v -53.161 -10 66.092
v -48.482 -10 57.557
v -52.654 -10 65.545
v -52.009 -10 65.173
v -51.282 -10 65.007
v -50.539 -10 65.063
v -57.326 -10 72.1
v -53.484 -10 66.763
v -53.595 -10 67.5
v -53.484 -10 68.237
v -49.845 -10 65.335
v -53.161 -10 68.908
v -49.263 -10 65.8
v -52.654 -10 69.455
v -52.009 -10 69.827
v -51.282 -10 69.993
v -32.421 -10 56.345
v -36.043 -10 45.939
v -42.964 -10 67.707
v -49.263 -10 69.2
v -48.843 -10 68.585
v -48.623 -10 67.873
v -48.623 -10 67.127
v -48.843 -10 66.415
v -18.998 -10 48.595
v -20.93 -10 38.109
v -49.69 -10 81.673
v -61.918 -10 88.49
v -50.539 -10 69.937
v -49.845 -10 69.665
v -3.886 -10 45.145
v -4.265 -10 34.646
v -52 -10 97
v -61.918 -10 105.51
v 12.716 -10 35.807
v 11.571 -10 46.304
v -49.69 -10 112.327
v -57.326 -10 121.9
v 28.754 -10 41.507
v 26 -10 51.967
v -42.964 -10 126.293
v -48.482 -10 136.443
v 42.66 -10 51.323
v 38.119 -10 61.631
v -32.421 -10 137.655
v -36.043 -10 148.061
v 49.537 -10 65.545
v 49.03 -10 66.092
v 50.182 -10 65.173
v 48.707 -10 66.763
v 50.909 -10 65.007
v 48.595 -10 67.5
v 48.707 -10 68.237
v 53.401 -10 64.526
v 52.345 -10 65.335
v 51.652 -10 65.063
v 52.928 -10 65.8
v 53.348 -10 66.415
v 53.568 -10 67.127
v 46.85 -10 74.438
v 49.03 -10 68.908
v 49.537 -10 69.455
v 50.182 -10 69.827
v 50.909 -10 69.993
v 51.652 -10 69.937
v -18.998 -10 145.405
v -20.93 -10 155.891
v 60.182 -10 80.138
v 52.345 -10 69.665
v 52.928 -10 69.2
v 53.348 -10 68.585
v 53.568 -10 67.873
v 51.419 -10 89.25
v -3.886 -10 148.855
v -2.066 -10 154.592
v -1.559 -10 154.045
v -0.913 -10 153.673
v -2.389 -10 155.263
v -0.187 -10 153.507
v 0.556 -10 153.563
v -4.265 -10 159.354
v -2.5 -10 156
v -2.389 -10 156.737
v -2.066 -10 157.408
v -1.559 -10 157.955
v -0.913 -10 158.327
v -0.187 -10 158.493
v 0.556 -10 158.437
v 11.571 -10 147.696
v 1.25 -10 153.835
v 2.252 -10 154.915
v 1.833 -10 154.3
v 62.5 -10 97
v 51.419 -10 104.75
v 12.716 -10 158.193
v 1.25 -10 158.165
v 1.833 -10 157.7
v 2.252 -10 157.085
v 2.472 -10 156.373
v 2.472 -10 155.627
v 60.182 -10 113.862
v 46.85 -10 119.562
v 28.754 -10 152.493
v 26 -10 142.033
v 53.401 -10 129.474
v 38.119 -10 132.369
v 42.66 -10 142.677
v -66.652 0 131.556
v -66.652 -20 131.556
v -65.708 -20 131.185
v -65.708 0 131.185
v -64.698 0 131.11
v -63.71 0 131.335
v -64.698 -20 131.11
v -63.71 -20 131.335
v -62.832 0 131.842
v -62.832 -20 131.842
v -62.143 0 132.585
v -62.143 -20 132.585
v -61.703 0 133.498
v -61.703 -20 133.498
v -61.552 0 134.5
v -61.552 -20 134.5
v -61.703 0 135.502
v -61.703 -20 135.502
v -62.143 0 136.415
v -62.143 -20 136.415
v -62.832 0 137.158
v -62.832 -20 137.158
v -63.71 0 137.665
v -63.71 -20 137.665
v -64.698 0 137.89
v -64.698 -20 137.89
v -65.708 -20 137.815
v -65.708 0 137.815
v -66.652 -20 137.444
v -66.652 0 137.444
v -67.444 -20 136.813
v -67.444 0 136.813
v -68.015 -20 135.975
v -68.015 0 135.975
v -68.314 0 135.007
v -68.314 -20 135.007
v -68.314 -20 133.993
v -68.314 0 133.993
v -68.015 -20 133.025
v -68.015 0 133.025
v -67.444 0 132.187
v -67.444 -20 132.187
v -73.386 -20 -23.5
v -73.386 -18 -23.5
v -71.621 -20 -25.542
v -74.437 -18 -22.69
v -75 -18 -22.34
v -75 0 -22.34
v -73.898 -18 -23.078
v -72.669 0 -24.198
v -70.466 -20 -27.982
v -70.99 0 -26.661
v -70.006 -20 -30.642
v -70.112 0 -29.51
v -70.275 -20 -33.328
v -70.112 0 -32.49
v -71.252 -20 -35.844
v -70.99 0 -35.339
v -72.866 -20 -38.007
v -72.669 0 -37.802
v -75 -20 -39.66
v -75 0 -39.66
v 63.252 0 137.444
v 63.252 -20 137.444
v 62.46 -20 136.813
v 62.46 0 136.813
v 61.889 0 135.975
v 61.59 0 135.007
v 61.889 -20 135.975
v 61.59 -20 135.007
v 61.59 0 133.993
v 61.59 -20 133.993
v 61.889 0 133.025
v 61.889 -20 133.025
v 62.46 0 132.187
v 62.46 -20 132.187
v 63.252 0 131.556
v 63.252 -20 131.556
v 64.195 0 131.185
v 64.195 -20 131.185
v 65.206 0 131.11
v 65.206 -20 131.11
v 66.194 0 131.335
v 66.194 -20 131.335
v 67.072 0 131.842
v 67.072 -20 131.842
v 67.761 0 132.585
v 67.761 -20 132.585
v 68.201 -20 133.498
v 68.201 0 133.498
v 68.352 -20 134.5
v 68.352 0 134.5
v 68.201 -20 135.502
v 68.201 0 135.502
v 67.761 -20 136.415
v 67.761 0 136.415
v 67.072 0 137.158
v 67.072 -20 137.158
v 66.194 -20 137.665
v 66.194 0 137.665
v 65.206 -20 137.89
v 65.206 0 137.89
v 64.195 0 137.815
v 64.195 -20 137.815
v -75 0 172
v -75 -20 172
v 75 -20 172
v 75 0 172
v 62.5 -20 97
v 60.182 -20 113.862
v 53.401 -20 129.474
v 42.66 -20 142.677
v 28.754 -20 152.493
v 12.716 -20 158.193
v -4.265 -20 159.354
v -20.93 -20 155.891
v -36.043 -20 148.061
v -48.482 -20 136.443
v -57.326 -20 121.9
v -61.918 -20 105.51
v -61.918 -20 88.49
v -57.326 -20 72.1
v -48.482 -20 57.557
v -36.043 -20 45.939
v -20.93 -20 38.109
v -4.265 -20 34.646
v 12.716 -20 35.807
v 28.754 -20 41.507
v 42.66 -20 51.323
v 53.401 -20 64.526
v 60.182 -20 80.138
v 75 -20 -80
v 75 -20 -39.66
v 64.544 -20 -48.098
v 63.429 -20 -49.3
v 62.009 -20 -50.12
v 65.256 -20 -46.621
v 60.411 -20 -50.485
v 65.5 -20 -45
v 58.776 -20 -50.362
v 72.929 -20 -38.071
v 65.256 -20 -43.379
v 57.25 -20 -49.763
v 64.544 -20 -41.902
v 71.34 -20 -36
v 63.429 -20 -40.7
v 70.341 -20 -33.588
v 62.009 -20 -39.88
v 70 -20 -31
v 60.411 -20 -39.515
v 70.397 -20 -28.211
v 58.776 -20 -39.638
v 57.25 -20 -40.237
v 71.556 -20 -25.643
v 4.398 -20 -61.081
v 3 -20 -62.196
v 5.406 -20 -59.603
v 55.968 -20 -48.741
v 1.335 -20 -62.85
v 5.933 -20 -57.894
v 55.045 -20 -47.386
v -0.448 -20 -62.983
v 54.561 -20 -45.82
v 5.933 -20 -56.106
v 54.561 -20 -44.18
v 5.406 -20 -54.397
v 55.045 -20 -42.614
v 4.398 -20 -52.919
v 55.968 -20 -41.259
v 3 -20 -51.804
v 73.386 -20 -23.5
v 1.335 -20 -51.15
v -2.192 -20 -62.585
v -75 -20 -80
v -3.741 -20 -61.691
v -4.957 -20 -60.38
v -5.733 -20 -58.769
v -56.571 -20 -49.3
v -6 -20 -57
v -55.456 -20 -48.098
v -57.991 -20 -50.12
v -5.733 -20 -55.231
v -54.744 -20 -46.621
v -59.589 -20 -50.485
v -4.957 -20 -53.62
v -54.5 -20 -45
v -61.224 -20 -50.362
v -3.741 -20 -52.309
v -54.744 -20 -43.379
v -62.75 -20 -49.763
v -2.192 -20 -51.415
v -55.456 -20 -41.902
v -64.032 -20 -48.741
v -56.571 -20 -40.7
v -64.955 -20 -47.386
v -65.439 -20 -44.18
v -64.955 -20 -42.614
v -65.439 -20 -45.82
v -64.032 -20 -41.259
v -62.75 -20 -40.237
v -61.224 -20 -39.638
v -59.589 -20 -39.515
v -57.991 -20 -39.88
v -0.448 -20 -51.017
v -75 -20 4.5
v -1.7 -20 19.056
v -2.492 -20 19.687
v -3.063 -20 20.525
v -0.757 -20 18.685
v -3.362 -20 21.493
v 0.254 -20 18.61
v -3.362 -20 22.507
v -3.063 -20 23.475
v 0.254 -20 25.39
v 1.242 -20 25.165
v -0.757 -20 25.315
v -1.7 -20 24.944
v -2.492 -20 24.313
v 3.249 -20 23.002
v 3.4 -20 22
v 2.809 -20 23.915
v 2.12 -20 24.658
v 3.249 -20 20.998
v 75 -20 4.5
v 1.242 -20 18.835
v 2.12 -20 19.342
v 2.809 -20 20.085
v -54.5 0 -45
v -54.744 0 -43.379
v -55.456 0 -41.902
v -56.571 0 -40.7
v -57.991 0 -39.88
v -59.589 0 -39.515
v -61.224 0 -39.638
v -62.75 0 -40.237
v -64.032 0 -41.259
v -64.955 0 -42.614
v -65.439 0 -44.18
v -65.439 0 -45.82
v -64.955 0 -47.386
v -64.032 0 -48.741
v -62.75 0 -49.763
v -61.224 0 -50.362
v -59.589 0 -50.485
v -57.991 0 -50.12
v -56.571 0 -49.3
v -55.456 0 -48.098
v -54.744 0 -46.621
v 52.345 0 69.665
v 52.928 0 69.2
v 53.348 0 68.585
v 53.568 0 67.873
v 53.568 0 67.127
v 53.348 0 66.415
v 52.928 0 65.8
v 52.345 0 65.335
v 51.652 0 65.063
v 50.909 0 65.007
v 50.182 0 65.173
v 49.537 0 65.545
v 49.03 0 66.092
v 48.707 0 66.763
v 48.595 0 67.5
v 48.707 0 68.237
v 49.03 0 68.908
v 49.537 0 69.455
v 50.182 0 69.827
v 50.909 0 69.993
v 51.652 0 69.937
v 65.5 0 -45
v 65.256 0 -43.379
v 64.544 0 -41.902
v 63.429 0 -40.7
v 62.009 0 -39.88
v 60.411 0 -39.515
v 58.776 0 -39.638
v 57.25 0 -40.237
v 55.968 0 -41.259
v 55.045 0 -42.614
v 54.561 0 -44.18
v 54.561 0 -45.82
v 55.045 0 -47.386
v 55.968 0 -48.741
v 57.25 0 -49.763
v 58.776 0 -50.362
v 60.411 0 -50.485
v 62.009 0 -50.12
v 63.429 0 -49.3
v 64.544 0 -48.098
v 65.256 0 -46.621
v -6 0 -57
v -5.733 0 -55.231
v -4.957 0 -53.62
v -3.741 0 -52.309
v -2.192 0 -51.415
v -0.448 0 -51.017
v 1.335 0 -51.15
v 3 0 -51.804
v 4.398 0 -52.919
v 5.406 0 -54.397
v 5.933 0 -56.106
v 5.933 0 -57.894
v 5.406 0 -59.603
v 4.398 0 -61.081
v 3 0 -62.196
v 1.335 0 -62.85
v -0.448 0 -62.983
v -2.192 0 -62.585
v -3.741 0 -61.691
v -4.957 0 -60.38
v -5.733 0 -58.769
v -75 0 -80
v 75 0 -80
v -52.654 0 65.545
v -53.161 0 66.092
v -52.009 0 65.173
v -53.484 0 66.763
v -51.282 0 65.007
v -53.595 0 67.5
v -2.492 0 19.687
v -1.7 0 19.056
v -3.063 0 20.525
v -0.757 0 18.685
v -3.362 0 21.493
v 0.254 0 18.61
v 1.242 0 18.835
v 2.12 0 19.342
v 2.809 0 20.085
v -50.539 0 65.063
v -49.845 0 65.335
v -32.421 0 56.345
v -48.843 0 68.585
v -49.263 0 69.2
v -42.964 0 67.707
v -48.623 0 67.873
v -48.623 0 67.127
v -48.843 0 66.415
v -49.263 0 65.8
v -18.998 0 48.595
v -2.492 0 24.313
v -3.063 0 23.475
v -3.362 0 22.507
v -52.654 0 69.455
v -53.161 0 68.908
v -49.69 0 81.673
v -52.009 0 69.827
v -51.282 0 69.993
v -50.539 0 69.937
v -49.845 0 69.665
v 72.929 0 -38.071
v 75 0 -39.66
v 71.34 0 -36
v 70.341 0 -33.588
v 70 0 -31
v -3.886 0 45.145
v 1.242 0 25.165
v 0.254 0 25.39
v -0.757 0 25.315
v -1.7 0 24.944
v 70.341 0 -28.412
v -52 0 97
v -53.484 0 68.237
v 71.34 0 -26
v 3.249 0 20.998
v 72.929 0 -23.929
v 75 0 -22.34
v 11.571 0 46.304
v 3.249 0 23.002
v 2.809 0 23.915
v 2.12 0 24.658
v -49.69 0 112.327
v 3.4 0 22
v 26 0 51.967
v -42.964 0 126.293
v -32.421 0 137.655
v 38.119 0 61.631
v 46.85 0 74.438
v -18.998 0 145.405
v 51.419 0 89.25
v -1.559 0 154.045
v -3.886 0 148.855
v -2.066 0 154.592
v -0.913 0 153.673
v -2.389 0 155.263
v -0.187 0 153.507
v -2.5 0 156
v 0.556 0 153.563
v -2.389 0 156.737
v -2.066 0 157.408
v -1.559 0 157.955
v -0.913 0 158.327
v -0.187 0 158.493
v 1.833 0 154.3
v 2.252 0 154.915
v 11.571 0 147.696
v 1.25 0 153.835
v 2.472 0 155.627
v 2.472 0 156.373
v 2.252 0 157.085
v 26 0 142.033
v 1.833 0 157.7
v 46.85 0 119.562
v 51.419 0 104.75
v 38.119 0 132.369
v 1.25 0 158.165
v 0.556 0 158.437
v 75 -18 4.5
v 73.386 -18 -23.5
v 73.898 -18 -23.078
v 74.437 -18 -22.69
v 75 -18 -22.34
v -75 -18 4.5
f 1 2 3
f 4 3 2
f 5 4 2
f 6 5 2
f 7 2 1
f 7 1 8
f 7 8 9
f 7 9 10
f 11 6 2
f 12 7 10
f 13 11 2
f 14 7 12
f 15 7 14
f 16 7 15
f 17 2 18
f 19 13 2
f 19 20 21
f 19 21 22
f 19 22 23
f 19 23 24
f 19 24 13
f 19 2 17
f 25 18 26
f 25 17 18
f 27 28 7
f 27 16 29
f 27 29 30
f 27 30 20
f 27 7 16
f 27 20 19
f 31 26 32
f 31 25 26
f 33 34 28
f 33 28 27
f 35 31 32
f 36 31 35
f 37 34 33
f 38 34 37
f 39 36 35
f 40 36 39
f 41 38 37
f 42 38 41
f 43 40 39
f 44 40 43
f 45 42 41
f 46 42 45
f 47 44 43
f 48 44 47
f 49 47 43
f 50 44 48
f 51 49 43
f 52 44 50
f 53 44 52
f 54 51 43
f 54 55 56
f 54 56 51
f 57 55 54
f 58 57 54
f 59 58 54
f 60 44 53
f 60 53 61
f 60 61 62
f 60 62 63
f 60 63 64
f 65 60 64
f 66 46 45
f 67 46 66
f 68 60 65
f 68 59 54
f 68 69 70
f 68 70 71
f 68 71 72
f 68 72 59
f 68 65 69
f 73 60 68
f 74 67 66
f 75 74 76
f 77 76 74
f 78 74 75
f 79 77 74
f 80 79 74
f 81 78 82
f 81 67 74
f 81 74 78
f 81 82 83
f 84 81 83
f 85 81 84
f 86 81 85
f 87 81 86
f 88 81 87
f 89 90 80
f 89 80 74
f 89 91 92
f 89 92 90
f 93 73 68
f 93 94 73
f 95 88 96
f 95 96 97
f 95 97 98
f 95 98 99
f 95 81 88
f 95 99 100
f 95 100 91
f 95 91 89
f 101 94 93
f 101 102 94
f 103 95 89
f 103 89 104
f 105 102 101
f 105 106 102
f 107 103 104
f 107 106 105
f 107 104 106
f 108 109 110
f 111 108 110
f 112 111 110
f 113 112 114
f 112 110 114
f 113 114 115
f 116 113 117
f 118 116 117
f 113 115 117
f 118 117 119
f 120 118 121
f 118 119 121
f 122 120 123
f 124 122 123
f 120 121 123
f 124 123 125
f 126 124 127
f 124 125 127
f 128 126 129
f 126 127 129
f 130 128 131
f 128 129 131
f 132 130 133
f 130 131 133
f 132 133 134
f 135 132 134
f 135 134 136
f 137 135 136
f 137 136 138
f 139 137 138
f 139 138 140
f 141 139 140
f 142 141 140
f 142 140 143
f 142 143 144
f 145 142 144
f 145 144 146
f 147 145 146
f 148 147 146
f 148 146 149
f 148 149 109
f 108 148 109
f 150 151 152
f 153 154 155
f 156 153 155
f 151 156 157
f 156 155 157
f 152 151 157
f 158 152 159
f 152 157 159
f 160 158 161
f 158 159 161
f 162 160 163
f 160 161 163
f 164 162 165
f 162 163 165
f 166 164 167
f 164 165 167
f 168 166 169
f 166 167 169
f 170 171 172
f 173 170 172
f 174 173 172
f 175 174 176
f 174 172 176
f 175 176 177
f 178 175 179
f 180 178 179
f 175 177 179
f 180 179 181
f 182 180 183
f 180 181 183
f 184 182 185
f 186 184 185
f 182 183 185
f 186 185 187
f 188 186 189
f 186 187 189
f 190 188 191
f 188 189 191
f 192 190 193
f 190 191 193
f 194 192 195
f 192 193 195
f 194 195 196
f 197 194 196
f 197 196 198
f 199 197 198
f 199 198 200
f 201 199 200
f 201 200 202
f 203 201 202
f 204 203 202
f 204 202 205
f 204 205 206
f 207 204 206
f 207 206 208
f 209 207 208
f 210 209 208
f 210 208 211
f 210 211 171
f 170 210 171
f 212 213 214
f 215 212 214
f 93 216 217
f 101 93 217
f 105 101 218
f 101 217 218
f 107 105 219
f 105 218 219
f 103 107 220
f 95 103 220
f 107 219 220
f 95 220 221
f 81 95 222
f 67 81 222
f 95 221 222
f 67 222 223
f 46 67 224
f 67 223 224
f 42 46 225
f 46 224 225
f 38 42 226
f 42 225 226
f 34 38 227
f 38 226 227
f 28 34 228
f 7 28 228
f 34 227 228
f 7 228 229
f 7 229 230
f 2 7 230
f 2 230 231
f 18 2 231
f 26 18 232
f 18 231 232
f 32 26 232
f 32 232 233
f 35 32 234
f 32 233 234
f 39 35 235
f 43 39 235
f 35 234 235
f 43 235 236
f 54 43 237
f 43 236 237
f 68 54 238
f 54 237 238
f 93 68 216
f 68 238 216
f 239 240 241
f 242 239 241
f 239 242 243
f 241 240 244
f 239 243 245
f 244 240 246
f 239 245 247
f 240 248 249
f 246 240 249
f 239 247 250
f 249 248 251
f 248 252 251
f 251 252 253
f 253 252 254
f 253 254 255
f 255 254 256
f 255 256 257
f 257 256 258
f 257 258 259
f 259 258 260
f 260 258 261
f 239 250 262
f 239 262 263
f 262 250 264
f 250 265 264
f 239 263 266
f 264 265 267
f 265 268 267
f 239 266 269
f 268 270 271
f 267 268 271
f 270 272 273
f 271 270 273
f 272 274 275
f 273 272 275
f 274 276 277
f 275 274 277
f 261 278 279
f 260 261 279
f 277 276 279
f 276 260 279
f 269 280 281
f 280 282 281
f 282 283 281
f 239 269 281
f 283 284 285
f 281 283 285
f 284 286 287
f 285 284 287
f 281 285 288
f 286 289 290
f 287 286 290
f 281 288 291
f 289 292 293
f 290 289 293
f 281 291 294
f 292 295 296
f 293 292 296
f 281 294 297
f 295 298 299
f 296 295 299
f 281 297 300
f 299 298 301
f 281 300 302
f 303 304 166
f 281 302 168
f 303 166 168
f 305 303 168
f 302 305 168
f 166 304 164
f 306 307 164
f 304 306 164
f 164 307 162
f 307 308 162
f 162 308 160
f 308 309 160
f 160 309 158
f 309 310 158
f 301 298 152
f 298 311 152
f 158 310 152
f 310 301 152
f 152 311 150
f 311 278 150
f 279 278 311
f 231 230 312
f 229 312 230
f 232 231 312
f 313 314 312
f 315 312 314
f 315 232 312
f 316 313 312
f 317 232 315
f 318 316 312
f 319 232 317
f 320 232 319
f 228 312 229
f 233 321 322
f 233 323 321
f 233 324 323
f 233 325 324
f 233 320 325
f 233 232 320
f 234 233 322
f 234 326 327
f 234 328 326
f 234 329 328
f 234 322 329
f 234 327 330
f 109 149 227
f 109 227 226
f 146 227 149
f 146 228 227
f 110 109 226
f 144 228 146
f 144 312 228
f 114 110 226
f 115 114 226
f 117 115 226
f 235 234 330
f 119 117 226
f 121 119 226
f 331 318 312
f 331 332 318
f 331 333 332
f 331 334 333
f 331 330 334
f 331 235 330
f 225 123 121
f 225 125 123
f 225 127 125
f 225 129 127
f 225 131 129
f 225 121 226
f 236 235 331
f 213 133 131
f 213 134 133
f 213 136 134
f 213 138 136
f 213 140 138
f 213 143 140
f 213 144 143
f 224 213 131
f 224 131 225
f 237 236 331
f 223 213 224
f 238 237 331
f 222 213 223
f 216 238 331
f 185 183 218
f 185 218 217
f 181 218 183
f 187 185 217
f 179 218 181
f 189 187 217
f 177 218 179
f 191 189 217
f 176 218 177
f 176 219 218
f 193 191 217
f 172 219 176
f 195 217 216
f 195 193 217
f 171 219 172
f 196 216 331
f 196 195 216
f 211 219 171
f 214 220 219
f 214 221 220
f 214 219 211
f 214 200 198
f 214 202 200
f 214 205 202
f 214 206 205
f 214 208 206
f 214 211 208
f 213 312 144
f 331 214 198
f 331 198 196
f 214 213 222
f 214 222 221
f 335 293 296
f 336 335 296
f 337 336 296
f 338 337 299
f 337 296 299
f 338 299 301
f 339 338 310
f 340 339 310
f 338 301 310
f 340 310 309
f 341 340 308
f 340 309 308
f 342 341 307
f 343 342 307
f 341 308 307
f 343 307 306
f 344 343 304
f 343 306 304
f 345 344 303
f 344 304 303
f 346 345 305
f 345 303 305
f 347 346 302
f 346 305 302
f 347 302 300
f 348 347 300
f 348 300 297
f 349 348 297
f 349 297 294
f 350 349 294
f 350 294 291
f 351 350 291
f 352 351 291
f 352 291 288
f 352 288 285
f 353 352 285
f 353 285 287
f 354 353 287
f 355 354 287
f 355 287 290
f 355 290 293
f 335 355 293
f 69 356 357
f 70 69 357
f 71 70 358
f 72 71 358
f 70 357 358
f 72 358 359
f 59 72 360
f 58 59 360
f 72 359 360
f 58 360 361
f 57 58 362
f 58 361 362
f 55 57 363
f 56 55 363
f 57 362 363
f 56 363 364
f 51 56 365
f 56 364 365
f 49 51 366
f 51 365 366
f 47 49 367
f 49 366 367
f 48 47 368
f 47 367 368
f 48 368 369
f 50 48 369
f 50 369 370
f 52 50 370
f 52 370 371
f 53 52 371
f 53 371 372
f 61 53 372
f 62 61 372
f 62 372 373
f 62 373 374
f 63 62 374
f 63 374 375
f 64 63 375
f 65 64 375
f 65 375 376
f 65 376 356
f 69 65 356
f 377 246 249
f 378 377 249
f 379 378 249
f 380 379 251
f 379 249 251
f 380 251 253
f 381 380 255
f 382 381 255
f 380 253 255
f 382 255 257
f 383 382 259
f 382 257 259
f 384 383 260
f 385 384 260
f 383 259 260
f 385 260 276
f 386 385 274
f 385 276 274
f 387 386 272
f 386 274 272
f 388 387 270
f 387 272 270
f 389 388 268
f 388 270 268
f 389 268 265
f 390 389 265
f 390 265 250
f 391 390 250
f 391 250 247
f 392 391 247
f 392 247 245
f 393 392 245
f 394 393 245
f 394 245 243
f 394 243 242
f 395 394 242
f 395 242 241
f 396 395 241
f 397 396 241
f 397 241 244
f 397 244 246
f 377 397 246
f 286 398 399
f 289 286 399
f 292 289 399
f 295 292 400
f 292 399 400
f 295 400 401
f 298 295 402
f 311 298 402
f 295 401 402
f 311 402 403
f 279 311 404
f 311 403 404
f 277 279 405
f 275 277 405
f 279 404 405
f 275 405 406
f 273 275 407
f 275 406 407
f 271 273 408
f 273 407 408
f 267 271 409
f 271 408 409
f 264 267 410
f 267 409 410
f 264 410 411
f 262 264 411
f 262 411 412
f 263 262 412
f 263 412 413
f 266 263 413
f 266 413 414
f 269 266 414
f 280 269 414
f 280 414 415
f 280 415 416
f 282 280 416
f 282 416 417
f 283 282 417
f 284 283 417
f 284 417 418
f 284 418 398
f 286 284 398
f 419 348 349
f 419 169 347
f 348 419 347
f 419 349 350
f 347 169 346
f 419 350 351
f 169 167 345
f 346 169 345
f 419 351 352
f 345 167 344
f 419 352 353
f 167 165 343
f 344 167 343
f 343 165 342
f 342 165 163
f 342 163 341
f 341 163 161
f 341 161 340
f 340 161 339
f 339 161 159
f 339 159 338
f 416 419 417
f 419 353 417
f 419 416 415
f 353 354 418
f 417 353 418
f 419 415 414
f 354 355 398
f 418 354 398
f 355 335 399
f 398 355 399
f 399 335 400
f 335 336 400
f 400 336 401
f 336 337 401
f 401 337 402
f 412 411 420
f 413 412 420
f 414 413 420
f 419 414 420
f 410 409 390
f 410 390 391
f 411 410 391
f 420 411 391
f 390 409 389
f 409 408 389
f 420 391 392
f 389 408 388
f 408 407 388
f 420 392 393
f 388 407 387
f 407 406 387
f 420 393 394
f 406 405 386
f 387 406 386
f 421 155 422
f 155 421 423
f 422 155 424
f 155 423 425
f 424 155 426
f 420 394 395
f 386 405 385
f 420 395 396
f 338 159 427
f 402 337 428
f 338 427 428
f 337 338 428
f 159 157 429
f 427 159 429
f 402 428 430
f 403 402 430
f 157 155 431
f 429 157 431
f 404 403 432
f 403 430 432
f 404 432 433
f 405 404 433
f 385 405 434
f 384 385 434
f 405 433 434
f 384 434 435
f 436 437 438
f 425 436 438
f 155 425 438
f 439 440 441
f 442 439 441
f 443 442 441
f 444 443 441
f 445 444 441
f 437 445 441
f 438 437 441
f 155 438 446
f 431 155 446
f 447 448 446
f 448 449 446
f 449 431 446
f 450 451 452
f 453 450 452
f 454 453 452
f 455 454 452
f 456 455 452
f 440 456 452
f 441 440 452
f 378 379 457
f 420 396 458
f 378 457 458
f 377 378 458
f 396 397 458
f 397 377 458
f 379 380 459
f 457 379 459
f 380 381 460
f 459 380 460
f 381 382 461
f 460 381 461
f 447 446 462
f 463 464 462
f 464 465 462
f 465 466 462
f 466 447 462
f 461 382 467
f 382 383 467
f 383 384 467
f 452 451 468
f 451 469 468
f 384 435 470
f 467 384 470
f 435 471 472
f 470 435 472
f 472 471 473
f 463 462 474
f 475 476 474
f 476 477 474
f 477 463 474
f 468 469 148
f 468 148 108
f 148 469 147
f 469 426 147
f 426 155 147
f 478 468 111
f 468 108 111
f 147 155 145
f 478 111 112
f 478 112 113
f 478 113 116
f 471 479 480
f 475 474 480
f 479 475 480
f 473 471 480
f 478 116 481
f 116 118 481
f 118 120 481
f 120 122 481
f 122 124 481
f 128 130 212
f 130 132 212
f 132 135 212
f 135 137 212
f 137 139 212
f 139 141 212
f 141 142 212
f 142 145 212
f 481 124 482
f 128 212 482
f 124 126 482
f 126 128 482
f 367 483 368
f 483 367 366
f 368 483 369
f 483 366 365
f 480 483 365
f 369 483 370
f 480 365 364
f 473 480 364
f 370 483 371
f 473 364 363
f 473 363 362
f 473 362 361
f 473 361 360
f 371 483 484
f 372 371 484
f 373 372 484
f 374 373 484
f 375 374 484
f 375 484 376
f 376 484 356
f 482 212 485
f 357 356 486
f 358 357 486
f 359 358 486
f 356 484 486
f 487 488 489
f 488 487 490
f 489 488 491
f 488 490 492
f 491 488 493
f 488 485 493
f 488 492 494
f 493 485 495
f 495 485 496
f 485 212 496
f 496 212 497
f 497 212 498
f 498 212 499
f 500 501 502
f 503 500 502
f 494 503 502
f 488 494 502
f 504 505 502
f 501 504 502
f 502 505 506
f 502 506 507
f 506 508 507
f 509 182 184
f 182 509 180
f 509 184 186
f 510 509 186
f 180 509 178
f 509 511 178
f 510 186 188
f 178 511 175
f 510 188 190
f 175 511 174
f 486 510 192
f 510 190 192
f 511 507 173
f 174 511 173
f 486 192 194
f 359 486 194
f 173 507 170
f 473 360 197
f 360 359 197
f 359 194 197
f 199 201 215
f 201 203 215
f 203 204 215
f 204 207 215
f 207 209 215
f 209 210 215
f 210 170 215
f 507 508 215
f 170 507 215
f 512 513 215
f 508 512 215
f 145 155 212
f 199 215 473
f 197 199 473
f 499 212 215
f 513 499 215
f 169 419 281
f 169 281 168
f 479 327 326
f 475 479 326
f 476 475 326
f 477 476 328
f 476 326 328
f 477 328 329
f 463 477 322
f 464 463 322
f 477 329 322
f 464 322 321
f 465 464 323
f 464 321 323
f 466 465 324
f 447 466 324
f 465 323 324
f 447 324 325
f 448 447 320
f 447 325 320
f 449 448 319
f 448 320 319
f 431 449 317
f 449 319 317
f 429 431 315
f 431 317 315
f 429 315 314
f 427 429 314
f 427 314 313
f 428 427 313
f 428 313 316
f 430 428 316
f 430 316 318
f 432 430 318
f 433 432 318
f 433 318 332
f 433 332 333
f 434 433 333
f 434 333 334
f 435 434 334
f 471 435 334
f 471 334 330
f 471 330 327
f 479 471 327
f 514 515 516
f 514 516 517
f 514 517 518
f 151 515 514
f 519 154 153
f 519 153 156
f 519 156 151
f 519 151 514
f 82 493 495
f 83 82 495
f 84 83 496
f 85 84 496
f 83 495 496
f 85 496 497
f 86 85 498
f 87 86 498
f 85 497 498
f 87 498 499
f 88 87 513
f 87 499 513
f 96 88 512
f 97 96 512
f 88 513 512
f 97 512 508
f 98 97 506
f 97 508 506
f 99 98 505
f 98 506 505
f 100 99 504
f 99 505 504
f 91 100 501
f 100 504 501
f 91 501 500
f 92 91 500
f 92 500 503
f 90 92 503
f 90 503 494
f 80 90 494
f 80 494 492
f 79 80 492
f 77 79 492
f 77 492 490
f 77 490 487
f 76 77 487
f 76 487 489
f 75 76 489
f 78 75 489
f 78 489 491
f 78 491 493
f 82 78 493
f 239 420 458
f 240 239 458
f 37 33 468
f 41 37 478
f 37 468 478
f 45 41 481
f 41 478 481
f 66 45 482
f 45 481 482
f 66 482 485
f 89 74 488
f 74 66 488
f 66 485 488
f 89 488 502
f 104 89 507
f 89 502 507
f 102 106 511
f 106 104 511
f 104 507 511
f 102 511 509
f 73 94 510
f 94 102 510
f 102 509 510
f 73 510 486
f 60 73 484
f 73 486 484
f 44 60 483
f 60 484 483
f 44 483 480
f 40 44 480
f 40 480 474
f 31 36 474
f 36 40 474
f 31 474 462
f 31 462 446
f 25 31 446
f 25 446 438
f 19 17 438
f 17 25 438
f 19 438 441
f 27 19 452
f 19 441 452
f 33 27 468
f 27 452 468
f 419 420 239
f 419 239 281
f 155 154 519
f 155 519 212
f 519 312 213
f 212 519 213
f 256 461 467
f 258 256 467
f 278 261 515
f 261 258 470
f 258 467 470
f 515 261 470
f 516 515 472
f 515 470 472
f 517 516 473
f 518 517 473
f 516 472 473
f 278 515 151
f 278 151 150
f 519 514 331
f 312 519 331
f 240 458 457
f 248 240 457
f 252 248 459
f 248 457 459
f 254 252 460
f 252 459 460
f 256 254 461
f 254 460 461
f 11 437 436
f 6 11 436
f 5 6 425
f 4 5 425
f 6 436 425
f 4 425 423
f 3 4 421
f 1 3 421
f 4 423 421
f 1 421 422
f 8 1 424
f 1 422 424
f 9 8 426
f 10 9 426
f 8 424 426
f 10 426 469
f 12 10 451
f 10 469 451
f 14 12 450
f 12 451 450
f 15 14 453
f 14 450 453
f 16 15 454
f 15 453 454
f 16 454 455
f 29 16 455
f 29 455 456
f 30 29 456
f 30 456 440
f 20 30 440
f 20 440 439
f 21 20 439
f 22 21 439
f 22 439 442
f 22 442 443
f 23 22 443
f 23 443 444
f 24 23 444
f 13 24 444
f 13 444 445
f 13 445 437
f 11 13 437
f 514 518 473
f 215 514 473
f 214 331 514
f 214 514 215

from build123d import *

# Parameters (mm, degrees)
F0_W             = 150
F0_H             = 90
F1_DEPTH         = 20
F2_R             = 5.5
F3_DEPTH         = 20.001
F4_W             = 2
F4_H             = 28
F5_DEPTH         = 150.001
F6_W             = 150
F6_H             = 124
F6_R             = 30
F7_DEPTH         = 20
F9_DEPTH         = 20.001
F11_W            = 150
F11_H            = 20
F12_DEPTH        = 20
F13_R            = 6
F14_DEPTH        = 20.001
F15_W            = 150
F15_H            = 18
F16_DEPTH        = 20
F17_R            = 52
F17_R_2          = 30
F18_DEPTH        = 20
F20_R            = 62.5
F20_R_2          = 52
F21_DEPTH        = 10
F22_R            = 3.4
F23_DEPTH        = 20.001
F23_COPIES_COUNT = 3
F24_R            = 2.5
F25_DEPTH        = 20.001
F25_COPIES_COUNT = 3


# Not quite as in the source:
# - a pattern or mirror of a feature is missing from the dataset's text; its kind, count and spacing are read off the source's solid


with BuildPart() as f1:
    # F0 (on Front) → F1 (new body)
    with BuildSketch(Plane.XZ):
        with Locations((0, -15)):
            Rectangle(F0_W, F0_H)
    extrude(amount=F1_DEPTH)

    # F2 (on face) → F3 (cut, through all)
    with BuildSketch(Plane.XZ.offset(20)):
        with Locations((-60, -45)):
            Circle(F2_R)
        with Locations((60, -45)):
            Circle(F2_R)
    extrude(amount=-F3_DEPTH, mode=Mode.SUBTRACT)

    # F4 (on face) → F5 (cut, through all)
    with BuildSketch(Plane(origin=(-75, 0, 0), x_dir=(0, -1, 0), z_dir=(-1, 0, 0))):
        with Locations((19, -9.5)):
            Rectangle(F4_W, F4_H)
    extrude(amount=-F5_DEPTH, mode=Mode.SUBTRACT)

    # F6 (on face) → F7 (join)
    with BuildSketch(Plane(origin=(0, 0, 0), x_dir=(-1, 0, 0), z_dir=(0, 1, 0))):
        with Locations((0, 92)):
            Rectangle(F6_W, F6_H)
        with Locations((0, 97)):
            Circle(F6_R, mode=Mode.SUBTRACT)
    extrude(amount=-F7_DEPTH)

    # F8 (on face) → F9 (cut, through all)
    with BuildSketch(Plane(origin=(0, 0, 0), x_dir=(-1, 0, 0), z_dir=(0, 1, 0))):
        with BuildLine():
            ThreePointArc((-75, -39.6602540378), (-71.3397459622, -36), (-70, -31))
            ThreePointArc((-70, -31), (-71.3397459622, -26), (-75, -22.3397459622))
            Line((-75, -22.3397459622), (-75, -39.6602540378))
        make_face()
        with BuildLine():
            Line((-75, -39.6602540378), (-75, -22.3397459622))
            ThreePointArc((-75, -22.3397459622), (-90, -31), (-75, -39.6602540378))
        make_face()
        with BuildLine():
            Line((75, -39.6602540378), (75, -22.3397459622))
            ThreePointArc((75, -22.3397459622), (70, -31), (75, -39.6602540378))
        make_face()
        with BuildLine():
            ThreePointArc((90, -31), (85, -22.3397459622), (75, -22.3397459622))
            Line((75, -22.3397459622), (75, -39.6602540378))
            ThreePointArc((75, -39.6602540378), (85, -39.6602540378), (90, -31))
        make_face()
    extrude(amount=-F9_DEPTH, mode=Mode.SUBTRACT)

    # F11 (on face) → F12 (join)
    with BuildSketch(Plane(origin=(0, 0, 0), x_dir=(-1, 0, 0), z_dir=(0, 1, 0))):
        with Locations((0, -70)):
            Rectangle(F11_W, F11_H)
    extrude(amount=-F12_DEPTH)

    # F13 (on face) → F14 (cut, through all)
    with BuildSketch(Plane(origin=(0, 0, 0), x_dir=(-1, 0, 0), z_dir=(0, 1, 0))):
        with Locations((0, -57)):
            Circle(F13_R)
    extrude(amount=-F14_DEPTH, mode=Mode.SUBTRACT)

    # F15 (on face) → F16 (join)
    with BuildSketch(Plane.XZ.offset(20)):
        with Locations((0, 163)):
            Rectangle(F15_W, F15_H)
    extrude(amount=-F16_DEPTH)

    # F17 (on face) → F18 (cut)
    with BuildSketch(Plane(origin=(0, 0, 0), x_dir=(-1, 0, 0), z_dir=(0, 1, 0))):
        with Locations((0, 97)):
            Circle(F17_R)
        with Locations((0, 97)):
            Circle(F17_R_2, mode=Mode.SUBTRACT)
    extrude(amount=-F18_DEPTH, mode=Mode.SUBTRACT)

    # F20 (on face) → F21 (cut)
    with BuildSketch(Plane.XZ.offset(20)):
        with Locations((0, 97)):
            Circle(F20_R)
        with Locations((0, 97)):
            Circle(F20_R_2, mode=Mode.SUBTRACT)
    extrude(amount=-F21_DEPTH, mode=Mode.SUBTRACT)

    # F22 (on face) → F23 (cut, through all)
    with BuildSketch(Plane.XZ.offset(20)):
        with Locations((0, 22)):
            Circle(F22_R)
    f23 = extrude(amount=-F23_DEPTH, mode=Mode.SUBTRACT)

    # F23_copies: F23 ×3 about axis
    f23_copies_axis = Axis((0, 0, 97), (0, 1, 0))
    for i in range(1, F23_COPIES_COUNT):
        add(f23.rotate(f23_copies_axis, i * 360 / F23_COPIES_COUNT), mode=Mode.SUBTRACT)

    # F24 (on face) → F25 (cut, through all)
    with BuildSketch(Plane(origin=(0, 0, 0), x_dir=(-1, 0, 0), z_dir=(0, 1, 0))):
        with Locations((0, 156)):
            Circle(F24_R)
    f25 = extrude(amount=-F25_DEPTH, mode=Mode.SUBTRACT)

    # F25_copies: F25 ×3 about axis
    f25_copies_axis = Axis((0, 0, 97), (0, 1, 0))
    for i in range(1, F25_COPIES_COUNT):
        add(f25.rotate(f25_copies_axis, i * 360 / F25_COPIES_COUNT), mode=Mode.SUBTRACT)


solid = f1.part
